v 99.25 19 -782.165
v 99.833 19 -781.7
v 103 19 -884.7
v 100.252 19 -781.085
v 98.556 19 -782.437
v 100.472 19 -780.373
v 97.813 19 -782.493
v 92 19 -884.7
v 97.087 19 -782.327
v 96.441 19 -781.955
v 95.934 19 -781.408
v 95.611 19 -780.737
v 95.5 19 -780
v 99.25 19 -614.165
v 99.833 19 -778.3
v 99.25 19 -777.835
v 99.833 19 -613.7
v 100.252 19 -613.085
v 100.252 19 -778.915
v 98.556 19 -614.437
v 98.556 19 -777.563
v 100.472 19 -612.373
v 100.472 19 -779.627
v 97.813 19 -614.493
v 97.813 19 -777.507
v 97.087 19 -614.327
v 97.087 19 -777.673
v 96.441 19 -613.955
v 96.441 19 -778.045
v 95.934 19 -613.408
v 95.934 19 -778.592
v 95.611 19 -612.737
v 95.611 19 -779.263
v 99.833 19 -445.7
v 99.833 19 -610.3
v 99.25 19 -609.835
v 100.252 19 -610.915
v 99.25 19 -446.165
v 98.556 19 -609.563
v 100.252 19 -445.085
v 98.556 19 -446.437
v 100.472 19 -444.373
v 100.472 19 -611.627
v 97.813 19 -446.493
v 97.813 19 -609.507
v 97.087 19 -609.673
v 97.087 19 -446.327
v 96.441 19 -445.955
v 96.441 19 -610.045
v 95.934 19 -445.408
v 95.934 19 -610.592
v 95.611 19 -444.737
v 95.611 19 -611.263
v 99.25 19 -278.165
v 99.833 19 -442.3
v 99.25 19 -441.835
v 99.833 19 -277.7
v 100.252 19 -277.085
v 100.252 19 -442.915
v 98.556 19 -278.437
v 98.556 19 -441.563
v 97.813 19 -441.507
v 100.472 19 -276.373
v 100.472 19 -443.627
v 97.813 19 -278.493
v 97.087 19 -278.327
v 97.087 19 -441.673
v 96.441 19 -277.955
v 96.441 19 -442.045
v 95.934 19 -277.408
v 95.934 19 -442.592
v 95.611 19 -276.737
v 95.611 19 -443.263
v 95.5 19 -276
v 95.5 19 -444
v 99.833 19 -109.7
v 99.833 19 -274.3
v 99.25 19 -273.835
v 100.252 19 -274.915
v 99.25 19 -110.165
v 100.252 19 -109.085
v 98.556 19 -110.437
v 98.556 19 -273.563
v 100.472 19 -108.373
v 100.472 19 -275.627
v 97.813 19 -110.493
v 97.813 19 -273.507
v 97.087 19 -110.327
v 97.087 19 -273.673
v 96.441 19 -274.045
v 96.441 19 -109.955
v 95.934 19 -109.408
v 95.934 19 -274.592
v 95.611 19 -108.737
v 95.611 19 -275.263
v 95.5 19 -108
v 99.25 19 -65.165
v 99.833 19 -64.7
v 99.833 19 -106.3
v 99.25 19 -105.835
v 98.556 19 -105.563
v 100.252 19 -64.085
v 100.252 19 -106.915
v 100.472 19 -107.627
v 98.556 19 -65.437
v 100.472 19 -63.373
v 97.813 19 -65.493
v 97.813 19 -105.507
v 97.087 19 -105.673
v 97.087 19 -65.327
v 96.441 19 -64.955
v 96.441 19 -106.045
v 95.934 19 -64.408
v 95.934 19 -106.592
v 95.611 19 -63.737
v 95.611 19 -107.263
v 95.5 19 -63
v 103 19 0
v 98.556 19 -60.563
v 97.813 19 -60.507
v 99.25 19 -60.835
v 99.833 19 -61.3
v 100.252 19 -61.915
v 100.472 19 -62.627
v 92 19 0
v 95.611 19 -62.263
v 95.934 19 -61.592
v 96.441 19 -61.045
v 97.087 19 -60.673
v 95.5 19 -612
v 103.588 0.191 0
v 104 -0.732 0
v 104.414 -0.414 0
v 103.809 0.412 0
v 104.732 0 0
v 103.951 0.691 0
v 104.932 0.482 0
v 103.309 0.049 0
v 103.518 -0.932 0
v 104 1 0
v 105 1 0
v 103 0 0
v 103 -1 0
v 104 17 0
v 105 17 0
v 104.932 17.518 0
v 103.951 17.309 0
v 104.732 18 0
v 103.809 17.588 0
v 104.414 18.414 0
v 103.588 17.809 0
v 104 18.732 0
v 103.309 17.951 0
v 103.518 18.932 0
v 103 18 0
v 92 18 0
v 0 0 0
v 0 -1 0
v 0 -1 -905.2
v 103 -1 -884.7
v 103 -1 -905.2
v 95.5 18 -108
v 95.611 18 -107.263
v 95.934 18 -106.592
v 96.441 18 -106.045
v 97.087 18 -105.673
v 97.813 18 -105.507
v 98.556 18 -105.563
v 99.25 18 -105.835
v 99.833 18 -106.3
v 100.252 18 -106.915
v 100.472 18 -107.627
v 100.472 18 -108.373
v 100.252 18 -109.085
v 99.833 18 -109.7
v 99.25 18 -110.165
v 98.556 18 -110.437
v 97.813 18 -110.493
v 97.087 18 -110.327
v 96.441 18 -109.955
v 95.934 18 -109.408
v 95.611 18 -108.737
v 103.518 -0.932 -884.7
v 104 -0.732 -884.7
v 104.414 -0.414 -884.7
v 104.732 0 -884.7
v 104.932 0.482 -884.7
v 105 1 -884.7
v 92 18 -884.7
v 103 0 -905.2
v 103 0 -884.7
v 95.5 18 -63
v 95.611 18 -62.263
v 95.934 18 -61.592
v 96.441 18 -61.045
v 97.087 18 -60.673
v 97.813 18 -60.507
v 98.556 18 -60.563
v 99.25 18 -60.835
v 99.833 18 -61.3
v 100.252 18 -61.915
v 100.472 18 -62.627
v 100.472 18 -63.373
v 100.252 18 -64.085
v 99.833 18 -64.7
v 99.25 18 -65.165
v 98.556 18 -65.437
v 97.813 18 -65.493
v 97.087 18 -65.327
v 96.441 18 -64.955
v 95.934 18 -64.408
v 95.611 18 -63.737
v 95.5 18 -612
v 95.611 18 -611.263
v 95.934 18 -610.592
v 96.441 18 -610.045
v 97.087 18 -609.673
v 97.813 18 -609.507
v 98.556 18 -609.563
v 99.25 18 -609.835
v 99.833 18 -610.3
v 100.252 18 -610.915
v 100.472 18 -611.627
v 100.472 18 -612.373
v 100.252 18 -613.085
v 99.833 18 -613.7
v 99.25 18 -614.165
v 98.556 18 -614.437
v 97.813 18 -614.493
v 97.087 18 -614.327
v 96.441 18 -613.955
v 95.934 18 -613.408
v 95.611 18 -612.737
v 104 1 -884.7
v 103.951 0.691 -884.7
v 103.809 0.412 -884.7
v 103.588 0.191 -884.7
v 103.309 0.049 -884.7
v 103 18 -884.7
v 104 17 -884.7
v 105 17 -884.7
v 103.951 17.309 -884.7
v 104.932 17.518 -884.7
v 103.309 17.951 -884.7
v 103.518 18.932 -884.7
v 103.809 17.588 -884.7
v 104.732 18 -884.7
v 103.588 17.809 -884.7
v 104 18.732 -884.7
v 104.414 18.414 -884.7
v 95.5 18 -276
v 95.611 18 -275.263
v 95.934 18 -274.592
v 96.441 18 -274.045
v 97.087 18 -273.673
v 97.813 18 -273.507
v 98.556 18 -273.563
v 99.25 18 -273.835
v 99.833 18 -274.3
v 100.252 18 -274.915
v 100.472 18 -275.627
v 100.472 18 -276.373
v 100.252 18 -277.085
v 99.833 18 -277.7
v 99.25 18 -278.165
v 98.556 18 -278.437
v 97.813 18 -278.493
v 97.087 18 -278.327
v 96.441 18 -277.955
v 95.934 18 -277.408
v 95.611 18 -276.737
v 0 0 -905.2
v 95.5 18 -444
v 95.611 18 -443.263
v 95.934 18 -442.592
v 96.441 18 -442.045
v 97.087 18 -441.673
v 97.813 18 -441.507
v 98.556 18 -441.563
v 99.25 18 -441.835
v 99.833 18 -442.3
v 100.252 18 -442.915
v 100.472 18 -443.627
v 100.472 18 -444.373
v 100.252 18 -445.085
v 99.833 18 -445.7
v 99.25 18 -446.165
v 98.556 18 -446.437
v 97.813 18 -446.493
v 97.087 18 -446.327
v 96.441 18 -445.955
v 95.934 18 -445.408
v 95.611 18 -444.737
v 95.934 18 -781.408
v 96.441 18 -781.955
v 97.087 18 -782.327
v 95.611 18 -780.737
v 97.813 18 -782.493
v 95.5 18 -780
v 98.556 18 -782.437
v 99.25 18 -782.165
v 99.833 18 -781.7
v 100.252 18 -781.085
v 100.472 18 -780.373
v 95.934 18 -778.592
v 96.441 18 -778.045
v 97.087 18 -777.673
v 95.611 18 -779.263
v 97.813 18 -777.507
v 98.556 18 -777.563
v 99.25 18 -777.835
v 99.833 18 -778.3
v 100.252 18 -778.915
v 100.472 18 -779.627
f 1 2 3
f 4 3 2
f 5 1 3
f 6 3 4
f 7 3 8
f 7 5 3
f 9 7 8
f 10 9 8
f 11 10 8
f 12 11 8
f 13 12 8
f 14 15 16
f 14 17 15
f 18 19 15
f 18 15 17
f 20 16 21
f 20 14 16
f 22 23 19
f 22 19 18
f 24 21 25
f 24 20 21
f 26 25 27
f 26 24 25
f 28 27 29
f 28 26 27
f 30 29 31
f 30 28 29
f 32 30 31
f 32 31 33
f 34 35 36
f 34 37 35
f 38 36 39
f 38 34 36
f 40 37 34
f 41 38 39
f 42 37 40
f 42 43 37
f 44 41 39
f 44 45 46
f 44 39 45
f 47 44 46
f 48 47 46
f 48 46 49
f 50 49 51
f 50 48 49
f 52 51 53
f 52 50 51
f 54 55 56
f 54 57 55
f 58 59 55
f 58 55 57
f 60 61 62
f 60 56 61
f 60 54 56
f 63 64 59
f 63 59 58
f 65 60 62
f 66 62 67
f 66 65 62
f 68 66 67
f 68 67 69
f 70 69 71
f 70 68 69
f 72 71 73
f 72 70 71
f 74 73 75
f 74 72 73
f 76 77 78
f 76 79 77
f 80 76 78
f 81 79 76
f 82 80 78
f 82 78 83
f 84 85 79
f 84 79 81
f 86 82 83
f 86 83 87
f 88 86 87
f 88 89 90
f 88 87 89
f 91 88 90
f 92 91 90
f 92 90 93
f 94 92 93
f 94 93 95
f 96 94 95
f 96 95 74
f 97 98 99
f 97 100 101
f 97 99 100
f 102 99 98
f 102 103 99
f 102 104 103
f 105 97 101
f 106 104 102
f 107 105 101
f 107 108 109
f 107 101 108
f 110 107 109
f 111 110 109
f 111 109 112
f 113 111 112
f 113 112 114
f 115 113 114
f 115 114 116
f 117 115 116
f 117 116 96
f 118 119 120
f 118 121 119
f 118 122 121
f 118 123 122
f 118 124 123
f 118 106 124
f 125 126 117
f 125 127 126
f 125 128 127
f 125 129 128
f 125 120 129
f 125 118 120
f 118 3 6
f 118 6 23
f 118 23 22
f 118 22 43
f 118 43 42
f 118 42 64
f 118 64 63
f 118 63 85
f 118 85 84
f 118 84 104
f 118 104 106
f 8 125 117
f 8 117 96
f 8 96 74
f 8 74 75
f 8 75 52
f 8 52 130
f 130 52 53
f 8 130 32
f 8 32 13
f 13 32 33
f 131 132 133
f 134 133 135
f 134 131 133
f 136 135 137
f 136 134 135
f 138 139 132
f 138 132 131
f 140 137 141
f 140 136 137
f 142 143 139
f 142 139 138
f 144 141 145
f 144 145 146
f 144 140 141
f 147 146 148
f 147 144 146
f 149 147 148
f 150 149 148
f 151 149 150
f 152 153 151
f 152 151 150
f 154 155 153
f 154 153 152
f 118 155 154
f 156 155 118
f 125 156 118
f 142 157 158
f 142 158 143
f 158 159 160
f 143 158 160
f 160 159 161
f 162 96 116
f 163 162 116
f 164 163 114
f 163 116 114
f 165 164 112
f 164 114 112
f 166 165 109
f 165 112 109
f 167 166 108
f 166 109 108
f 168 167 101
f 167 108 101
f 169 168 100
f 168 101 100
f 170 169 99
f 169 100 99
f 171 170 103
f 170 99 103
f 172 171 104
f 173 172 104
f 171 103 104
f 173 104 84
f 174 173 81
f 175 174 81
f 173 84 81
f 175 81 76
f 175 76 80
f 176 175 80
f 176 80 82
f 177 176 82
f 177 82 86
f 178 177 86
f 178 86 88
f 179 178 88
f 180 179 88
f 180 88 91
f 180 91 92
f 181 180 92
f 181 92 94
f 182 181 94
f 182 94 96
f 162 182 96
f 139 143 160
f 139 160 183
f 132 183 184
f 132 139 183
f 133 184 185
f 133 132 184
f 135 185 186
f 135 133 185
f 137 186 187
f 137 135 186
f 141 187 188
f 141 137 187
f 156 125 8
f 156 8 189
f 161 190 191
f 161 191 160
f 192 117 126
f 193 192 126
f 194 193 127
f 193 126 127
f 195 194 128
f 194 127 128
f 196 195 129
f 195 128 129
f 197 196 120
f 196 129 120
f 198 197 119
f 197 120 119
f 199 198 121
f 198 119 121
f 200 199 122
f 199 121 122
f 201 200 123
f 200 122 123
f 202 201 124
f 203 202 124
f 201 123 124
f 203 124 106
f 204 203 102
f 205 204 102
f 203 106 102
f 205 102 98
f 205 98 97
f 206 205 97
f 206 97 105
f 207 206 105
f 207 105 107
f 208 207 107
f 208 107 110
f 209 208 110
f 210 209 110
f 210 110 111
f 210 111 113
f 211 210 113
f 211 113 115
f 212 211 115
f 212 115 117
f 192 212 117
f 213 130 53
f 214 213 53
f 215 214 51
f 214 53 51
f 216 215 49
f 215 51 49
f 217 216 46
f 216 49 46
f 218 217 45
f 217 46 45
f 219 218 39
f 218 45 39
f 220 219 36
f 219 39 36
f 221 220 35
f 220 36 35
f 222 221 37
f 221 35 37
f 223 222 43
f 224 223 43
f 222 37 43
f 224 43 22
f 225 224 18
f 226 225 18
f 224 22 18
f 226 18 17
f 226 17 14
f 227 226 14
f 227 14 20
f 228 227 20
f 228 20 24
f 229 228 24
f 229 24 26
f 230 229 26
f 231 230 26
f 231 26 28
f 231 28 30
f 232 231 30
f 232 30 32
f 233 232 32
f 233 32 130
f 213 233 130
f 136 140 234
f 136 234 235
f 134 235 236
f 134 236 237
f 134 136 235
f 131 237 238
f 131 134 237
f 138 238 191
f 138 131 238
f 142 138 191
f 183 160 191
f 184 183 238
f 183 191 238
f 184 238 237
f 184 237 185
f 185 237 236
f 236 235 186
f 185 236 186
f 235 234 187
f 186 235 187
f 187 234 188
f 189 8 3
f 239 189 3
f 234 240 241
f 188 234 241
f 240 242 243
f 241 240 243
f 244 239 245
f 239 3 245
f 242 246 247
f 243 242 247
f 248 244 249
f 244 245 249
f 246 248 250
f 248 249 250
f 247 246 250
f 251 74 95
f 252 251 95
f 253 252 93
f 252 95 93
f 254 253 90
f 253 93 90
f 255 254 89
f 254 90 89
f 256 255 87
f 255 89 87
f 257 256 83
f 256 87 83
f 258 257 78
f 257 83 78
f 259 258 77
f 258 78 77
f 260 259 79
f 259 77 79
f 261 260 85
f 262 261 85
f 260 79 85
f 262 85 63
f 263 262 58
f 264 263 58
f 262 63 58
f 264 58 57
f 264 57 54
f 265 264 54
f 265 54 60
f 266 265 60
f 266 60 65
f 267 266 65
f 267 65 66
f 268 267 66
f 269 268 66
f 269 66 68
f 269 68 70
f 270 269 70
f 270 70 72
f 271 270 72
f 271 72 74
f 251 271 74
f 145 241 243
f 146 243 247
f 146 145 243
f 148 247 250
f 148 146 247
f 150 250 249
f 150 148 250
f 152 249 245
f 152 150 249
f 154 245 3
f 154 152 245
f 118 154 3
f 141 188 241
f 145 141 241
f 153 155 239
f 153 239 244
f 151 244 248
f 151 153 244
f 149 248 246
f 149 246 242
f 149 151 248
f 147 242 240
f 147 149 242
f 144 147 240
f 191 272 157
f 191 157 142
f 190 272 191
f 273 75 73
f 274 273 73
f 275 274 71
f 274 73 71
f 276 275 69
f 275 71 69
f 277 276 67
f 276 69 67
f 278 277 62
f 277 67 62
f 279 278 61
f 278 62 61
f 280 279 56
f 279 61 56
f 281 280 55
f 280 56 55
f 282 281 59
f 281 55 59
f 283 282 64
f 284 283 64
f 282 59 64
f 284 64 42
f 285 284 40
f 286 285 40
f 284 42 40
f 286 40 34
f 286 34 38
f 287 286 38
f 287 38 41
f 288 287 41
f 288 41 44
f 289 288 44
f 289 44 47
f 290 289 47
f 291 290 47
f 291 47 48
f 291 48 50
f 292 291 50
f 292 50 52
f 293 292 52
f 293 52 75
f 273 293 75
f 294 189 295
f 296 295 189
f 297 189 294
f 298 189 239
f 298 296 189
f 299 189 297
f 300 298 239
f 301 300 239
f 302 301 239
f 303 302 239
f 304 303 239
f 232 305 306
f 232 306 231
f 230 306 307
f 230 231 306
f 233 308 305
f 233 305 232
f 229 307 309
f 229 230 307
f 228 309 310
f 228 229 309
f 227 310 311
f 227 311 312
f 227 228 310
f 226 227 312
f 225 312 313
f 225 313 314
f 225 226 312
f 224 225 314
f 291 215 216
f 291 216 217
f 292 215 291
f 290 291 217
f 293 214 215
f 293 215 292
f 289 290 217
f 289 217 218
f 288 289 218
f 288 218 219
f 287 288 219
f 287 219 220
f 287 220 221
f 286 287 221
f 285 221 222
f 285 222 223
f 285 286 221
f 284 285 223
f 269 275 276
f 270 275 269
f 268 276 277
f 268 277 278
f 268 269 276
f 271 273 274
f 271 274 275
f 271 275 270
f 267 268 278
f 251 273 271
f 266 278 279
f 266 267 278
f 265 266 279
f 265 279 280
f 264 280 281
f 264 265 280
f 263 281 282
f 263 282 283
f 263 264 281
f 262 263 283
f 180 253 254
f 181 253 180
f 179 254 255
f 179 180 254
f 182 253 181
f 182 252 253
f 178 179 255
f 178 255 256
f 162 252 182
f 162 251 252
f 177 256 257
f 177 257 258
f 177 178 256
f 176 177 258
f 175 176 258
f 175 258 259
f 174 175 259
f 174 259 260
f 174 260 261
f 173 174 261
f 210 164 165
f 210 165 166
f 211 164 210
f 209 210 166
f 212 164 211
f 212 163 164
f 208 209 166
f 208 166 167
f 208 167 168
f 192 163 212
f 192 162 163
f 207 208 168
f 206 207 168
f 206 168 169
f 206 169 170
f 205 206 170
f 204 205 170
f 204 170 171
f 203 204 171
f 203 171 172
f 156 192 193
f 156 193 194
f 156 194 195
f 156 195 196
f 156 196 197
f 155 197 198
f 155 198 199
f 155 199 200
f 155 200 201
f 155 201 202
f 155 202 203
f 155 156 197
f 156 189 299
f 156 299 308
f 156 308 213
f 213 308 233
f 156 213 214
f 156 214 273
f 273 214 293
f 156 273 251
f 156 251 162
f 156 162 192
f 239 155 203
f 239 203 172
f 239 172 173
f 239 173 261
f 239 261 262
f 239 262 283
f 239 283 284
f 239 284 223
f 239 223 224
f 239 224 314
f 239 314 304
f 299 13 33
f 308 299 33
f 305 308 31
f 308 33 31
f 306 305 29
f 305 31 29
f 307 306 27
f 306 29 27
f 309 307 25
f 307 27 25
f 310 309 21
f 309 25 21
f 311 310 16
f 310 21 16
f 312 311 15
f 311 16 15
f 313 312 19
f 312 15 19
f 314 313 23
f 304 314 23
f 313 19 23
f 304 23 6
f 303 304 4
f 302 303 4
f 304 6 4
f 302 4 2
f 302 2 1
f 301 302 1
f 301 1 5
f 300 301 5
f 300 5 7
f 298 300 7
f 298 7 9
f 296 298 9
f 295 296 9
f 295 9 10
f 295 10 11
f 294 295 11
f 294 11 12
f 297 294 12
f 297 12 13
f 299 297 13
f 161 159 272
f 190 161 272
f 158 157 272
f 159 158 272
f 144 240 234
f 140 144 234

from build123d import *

# Parameters (mm, degrees)
SKETCH1_W                    = 105
SKETCH1_H                    = 905.2
BASE_FLANGE1_DEPTH           = 1
EDGE_FLANGE1_STRIP_W         = 6
EDGE_FLANGE1_STRIP_H         = 1
EDGE_FLANGE1_STRIP_CUT_DEPTH = 905.2
EDGE_FLANGE1_DEPTH           = 905.2
EDGE_FLANGE2_STRIP_W         = 6
EDGE_FLANGE2_STRIP_H         = 1
EDGE_FLANGE2_STRIP_CUT_DEPTH = 905.2
EDGE_FLANGE2_DEPTH           = 905.2
SKETCH19_R                   = 2.5
CUT_EXTRUDE2_DEPTH           = 10
CUT_EXTRUDE3_START           = -905.2
CUT_EXTRUDE3_DEPTH           = 20.5


# Read off the part's stored shape, not the designer's step: Cut-Extrude3
# Sheet-metal steps are written as plain solids
with BuildPart() as part:
    # Sketch1 → Base-Flange1 (new body)
    with BuildSketch(Plane(origin=(0, 0, 0), x_dir=(1, 0, 0), z_dir=(0, 1, 0))):
        with Locations((52.5, 452.6)):
            Rectangle(SKETCH1_W, SKETCH1_H)
    extrude(amount=-BASE_FLANGE1_DEPTH)

    # Edge-Flange1 strip (across the edge) → Edge-Flange1 strip cut (cut)
    with BuildSketch(Plane(origin=(105, 0, 0), x_dir=(-1, 0, 0), z_dir=(0, 0, -1))):
        with Locations((-1, -0.5)):
            Rectangle(EDGE_FLANGE1_STRIP_W, EDGE_FLANGE1_STRIP_H)
    extrude(amount=EDGE_FLANGE1_STRIP_CUT_DEPTH, mode=Mode.SUBTRACT)

    # Edge-Flange1 section (across the edge) → Edge-Flange1 (add)
    with BuildSketch(Plane(origin=(105, 0, 0), x_dir=(-1, 0, 0), z_dir=(0, 0, -1))):
        with BuildLine():
            Line((0, 1), (0, 19))
            Line((0, 19), (1, 19))
            Line((1, 19), (1, 1))
            ThreePointArc((1, 1), (1.292893219, 0.292893219), (2, 0))
            Line((2, 0), (2, -1))
            ThreePointArc((2, -1), (0.585786438, -0.414213562), (0, 1))
        make_face()
    extrude(amount=EDGE_FLANGE1_DEPTH)

    # Edge-Flange2 strip (across the edge) → Edge-Flange2 strip cut (cut)
    with BuildSketch(Plane(origin=(104, 19, 0), x_dir=(0, -1, 0), z_dir=(0, 0, -1))):
        with Locations((-1, -0.5)):
            Rectangle(EDGE_FLANGE2_STRIP_W, EDGE_FLANGE2_STRIP_H)
    extrude(amount=EDGE_FLANGE2_STRIP_CUT_DEPTH, mode=Mode.SUBTRACT)

    # Edge-Flange2 section (across the edge) → Edge-Flange2 (add)
    with BuildSketch(Plane(origin=(104, 19, 0), x_dir=(0, -1, 0), z_dir=(0, 0, -1))):
        with BuildLine():
            Line((0, 1), (0, 12))
            Line((0, 12), (1, 12))
            Line((1, 12), (1, 1))
            ThreePointArc((1, 1), (1.292893219, 0.292893219), (2, 0))
            Line((2, 0), (2, -1))
            ThreePointArc((2, -1), (0.585786438, -0.414213562), (0, 1))
        make_face()
    extrude(amount=EDGE_FLANGE2_DEPTH)

    # Sketch19 → Cut-Extrude2 (cut)
    with BuildSketch(Plane(origin=(0, 19, 0), x_dir=(1, 0, 0), z_dir=(0, 1, 0))):
        with Locations(Location((98, 63, 0), (0, 0, 180))):
            Circle(SKETCH19_R)
        with Locations(Location((98, 108, 0), (0, 0, 180))):
            Circle(SKETCH19_R)
        with Locations(Location((98, 276, 0), (0, 0, 180))):
            Circle(SKETCH19_R)
        with Locations(Location((98, 444, 0), (0, 0, 180))):
            Circle(SKETCH19_R)
        with Locations(Location((98, 612, 0), (0, 0, 180))):
            Circle(SKETCH19_R)
        with Locations(Location((98, 780, 0), (0, 0, 180))):
            Circle(SKETCH19_R)
    extrude(amount=-CUT_EXTRUDE2_DEPTH, mode=Mode.SUBTRACT)

    # Cut-Extrude3 outline → Cut-Extrude3 (cut)
    with BuildSketch(Plane.XY.offset(CUT_EXTRUDE3_START)):
        with BuildLine():
            ThreePointArc((104, 1), (103.707106781, 0.292893219), (103, 0))
            Line((103, 0), (103, -1))
            ThreePointArc((103, -1), (104.414213562, -0.414213562), (105, 1))
            Line((105, 1), (105, 17))
            ThreePointArc((105, 17), (104.414213562, 18.414213562), (103, 19))
            Line((103, 19), (92, 19))
            Line((92, 19), (92, 18))
            Line((92, 18), (103, 18))
            ThreePointArc((103, 18), (103.707106781, 17.707106781), (104, 17))
            Line((104, 17), (104, 1))
        make_face()
    extrude(amount=CUT_EXTRUDE3_DEPTH, mode=Mode.SUBTRACT)


solid = part.part
